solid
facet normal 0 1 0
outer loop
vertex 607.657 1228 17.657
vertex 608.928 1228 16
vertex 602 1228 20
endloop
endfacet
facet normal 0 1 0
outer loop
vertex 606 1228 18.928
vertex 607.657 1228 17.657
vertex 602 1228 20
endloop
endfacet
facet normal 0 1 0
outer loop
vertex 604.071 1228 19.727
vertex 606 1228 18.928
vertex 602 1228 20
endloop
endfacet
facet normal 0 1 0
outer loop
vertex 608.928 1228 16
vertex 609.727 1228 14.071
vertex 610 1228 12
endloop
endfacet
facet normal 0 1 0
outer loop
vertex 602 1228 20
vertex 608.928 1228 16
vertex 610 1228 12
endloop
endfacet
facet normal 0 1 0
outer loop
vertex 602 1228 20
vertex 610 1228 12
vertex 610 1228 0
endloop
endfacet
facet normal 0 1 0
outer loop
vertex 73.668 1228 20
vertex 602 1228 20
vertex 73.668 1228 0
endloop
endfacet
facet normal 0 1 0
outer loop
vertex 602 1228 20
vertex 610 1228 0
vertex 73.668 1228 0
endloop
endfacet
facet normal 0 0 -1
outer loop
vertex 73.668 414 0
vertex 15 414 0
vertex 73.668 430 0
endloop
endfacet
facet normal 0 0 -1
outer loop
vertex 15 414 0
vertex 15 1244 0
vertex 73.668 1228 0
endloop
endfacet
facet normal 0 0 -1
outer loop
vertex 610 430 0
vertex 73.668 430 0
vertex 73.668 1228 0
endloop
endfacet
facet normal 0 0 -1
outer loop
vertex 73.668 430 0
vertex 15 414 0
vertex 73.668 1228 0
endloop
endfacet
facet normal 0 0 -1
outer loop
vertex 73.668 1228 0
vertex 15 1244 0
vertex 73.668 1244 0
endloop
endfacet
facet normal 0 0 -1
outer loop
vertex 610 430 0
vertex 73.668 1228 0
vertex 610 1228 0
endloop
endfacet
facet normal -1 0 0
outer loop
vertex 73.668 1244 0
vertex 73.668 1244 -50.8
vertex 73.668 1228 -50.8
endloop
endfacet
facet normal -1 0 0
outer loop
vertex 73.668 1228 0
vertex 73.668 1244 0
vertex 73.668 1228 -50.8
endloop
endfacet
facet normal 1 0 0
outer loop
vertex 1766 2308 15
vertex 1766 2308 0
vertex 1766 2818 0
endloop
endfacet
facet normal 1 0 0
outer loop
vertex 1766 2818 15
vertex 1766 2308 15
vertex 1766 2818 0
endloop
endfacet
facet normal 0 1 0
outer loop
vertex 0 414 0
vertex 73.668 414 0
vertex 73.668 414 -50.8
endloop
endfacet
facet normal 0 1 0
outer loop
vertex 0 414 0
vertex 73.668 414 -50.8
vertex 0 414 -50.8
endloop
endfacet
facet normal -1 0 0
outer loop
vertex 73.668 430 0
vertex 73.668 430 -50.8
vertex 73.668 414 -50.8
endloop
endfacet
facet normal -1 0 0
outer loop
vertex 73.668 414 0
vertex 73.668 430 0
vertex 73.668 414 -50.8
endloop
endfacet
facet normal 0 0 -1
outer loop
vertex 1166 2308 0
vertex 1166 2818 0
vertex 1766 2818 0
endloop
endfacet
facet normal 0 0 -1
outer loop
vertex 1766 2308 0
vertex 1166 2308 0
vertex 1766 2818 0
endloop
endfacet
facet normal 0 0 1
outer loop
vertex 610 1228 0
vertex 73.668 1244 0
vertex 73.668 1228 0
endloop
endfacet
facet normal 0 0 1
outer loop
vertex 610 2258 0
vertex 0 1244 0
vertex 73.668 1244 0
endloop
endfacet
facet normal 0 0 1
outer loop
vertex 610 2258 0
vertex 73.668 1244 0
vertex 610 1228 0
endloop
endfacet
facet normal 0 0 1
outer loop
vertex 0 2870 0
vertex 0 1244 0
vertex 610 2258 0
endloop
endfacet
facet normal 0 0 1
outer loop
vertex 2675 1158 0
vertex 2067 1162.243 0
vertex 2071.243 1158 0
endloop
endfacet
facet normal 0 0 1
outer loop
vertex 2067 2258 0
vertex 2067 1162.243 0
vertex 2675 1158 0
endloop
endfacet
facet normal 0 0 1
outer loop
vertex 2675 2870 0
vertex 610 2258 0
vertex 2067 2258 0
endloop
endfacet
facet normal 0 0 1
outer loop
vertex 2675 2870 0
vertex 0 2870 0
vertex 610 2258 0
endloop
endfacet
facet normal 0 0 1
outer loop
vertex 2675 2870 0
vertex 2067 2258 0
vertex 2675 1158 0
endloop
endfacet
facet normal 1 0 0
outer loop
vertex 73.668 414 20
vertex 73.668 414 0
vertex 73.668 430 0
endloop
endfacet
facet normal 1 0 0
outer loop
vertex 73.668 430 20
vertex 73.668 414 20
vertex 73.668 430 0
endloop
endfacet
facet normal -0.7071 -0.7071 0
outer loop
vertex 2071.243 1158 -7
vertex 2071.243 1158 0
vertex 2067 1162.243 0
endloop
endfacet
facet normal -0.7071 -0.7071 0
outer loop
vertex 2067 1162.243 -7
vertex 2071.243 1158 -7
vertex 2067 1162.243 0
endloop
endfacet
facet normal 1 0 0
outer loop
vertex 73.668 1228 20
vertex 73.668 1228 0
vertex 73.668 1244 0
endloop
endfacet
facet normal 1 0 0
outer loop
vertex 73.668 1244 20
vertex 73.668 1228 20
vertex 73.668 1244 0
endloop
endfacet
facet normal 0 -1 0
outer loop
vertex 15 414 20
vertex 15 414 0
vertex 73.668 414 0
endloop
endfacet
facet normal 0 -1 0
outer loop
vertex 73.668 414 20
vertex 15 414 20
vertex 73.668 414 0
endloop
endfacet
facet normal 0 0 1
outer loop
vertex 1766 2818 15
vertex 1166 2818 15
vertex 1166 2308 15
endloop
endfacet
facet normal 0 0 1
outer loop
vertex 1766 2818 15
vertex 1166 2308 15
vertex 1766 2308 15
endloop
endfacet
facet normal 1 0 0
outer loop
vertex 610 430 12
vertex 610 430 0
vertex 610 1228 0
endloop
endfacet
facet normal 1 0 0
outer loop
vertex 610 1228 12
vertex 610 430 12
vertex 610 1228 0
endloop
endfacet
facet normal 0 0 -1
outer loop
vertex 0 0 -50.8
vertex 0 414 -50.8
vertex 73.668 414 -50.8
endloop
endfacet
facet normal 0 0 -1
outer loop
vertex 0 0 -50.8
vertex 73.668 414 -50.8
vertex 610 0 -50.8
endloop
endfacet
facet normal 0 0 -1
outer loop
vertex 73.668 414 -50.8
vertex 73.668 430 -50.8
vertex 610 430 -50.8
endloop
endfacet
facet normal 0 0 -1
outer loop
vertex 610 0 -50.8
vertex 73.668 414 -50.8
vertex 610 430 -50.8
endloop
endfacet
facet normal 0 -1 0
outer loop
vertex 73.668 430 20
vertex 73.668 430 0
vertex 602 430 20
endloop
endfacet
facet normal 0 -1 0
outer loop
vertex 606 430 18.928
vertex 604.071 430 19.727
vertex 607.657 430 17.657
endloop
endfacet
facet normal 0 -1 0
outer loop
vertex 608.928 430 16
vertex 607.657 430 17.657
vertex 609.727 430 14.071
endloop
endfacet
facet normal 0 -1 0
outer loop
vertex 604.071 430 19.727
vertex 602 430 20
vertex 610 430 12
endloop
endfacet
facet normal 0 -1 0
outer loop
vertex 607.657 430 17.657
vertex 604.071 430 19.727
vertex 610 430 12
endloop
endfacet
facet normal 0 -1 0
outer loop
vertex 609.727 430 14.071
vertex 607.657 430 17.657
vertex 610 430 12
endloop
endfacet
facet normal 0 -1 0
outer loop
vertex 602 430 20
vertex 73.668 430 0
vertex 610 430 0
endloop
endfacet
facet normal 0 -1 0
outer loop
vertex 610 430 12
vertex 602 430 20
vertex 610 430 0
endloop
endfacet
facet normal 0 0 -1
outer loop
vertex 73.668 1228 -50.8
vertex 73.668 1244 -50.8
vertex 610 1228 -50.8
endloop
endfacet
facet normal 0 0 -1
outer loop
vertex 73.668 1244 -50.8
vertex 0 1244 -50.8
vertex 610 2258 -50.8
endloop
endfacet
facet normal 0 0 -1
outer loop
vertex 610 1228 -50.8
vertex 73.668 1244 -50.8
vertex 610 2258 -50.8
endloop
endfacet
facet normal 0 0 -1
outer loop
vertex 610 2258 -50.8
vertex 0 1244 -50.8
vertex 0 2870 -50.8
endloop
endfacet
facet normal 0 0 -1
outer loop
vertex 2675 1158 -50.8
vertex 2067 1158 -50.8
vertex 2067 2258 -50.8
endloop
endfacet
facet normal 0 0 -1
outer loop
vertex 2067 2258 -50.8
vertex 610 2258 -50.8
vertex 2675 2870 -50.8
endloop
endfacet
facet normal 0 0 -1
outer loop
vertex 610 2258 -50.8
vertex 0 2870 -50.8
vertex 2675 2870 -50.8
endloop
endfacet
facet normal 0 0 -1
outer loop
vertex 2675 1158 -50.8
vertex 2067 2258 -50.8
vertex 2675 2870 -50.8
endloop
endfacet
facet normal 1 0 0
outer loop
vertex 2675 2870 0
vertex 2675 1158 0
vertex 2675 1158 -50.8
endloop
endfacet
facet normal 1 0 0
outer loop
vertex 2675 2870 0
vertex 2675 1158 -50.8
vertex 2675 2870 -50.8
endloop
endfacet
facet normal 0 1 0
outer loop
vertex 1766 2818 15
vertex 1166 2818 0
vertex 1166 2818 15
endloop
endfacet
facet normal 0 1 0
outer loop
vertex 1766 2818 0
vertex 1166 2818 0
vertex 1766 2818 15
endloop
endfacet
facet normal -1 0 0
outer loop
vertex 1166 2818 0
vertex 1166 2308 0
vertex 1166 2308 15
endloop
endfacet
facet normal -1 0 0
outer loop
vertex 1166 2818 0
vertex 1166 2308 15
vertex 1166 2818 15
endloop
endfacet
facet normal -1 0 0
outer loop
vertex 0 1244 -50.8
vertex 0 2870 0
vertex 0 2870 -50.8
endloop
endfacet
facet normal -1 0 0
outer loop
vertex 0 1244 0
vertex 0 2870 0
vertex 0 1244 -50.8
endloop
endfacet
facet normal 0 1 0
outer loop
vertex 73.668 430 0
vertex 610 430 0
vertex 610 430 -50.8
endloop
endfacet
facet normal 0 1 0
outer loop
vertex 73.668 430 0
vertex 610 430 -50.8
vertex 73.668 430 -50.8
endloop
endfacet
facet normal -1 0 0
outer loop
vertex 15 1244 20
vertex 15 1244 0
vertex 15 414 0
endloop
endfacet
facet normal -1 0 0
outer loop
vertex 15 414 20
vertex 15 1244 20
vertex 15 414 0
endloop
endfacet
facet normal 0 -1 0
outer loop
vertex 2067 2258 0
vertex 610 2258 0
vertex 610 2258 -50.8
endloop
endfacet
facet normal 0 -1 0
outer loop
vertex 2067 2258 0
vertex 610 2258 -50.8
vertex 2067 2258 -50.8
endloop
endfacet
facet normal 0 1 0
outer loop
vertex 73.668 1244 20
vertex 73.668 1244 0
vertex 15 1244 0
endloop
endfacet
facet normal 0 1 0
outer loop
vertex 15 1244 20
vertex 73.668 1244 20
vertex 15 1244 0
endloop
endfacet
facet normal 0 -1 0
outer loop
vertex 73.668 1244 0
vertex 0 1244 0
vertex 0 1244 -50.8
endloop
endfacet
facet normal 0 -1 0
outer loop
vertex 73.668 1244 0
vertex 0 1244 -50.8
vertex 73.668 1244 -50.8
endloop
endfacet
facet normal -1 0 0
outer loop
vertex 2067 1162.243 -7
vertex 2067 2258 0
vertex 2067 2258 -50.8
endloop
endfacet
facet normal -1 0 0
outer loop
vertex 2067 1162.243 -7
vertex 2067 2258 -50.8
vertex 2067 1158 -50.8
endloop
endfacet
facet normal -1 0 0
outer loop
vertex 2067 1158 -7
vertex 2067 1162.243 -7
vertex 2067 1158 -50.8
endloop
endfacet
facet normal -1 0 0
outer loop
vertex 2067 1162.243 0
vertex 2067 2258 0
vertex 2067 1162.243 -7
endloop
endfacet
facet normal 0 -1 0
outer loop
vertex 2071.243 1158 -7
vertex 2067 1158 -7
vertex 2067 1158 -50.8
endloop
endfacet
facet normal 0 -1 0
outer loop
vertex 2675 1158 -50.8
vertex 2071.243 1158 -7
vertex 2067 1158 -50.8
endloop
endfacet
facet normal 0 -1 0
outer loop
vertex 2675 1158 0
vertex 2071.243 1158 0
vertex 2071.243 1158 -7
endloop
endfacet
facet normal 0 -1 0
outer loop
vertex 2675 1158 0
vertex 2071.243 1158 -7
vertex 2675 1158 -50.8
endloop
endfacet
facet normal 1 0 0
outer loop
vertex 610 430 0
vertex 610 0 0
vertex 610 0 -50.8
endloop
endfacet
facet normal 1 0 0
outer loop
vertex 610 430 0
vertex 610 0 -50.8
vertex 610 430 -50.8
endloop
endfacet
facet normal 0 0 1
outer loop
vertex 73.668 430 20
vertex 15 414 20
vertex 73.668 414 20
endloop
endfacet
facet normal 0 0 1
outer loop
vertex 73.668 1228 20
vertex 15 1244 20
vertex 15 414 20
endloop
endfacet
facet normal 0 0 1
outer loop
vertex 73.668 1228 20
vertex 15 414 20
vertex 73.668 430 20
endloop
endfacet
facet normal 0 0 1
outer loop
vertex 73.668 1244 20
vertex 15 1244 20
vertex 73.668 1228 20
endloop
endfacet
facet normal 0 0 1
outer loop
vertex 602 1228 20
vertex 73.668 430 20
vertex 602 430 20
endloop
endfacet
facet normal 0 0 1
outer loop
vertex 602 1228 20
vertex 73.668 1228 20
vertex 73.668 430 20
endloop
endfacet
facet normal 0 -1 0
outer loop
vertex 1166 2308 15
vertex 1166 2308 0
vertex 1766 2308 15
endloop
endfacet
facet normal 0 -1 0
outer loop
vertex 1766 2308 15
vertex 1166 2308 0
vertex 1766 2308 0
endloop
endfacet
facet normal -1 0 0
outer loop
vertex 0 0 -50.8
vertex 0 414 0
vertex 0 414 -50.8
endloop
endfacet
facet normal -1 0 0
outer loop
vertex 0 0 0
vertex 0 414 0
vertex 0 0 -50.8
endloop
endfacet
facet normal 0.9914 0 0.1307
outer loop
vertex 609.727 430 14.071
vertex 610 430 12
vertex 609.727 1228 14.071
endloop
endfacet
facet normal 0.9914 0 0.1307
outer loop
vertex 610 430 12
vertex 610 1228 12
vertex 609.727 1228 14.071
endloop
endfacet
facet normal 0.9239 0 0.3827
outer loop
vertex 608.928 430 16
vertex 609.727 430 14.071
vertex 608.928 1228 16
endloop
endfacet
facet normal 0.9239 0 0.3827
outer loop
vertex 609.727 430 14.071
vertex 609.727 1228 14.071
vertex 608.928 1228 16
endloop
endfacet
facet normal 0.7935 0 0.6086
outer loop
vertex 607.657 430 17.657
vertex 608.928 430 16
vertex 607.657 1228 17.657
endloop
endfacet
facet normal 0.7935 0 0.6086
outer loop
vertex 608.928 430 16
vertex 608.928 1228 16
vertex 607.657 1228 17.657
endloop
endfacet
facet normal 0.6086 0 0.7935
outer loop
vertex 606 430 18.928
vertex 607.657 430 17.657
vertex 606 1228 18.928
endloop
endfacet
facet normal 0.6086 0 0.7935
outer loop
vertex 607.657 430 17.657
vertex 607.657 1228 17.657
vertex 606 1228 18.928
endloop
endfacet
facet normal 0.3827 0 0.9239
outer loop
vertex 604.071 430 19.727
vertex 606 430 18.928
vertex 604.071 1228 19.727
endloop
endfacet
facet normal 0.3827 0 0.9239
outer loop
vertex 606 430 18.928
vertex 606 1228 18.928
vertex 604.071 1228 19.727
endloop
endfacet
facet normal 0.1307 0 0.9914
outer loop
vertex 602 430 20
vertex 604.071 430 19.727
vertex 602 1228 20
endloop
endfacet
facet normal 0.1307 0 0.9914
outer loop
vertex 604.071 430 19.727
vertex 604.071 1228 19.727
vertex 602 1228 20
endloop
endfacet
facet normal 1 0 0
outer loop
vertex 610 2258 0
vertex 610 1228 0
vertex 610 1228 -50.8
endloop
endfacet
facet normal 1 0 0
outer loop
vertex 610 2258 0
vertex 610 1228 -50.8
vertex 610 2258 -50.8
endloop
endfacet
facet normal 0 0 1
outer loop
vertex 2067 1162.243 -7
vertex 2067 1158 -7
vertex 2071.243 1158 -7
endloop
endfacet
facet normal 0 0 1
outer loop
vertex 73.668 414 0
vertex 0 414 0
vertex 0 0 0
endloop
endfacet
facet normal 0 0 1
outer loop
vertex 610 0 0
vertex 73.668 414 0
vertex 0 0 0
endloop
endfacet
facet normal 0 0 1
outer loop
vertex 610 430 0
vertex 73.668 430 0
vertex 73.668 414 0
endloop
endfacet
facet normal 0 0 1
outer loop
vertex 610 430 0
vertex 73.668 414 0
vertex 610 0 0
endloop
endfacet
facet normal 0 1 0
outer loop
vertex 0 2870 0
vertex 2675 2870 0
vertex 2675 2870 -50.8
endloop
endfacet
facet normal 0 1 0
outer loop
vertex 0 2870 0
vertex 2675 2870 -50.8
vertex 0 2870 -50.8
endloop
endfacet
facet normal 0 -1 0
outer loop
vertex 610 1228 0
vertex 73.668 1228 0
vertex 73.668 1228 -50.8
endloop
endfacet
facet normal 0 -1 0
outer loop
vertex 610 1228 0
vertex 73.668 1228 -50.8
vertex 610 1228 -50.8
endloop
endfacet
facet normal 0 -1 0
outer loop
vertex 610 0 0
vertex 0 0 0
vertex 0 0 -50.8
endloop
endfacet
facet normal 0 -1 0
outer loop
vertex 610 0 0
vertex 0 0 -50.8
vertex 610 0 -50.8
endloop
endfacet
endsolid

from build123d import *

# Parameters (mm, degrees)
F1_DEPTH = 50.8
F2_W     = 600
F2_H     = 510
F3_DEPTH = 15
F5_DEPTH = 20
F6_R     = 8
F8_DEPTH = 7


with BuildPart() as f1:
    # F0 (on Top) → F1 (new body)
    with BuildSketch(Plane.XY):
        Polygon((610, 1228), (610, 2258), (2067, 2258), (2067, 1158), (2675, 1158), (2675, 2870), (0, 2870), (0, 1244), (73.668413, 1244), (73.668413, 1228), align=None)
        Polygon((0, 414), (0, 0), (610, 0), (610, 430), (73.668413, 430), (73.668413, 414), align=None)
    extrude(amount=-F1_DEPTH)

    # F7 (on face) → F8 (cut)
    with BuildSketch(Plane.XY):
        Polygon((2076.880734, 1152.361907), (2062.746637, 1166.496004), (2060.033986, 1152.361907), align=None)
    extrude(amount=-F8_DEPTH, mode=Mode.SUBTRACT)


with BuildPart() as f3:
    # F2 (on face) → F3 (new body)
    with BuildSketch(Plane.XY):
        with Locations((1466, 2563)):
            Rectangle(F2_W, F2_H)
    extrude(amount=F3_DEPTH)


with BuildPart() as f5:
    # F4 (on face) → F5 (new body)
    with BuildSketch(Plane.XY):
        Polygon((610, 430), (610, 1228), (73.668413, 1228), (73.668413, 1244), (15, 1244), (15, 414), (73.668413, 414), (73.668413, 430), align=None)
    extrude(amount=F5_DEPTH)

    # F6
    f6_edges = [f5.edges().sort_by_distance(p)[0] for p in [
        (610, 829, 20),
    ]]
    fillet(f6_edges, radius=F6_R)


solid = Compound([f1.part, f3.part, f5.part])
